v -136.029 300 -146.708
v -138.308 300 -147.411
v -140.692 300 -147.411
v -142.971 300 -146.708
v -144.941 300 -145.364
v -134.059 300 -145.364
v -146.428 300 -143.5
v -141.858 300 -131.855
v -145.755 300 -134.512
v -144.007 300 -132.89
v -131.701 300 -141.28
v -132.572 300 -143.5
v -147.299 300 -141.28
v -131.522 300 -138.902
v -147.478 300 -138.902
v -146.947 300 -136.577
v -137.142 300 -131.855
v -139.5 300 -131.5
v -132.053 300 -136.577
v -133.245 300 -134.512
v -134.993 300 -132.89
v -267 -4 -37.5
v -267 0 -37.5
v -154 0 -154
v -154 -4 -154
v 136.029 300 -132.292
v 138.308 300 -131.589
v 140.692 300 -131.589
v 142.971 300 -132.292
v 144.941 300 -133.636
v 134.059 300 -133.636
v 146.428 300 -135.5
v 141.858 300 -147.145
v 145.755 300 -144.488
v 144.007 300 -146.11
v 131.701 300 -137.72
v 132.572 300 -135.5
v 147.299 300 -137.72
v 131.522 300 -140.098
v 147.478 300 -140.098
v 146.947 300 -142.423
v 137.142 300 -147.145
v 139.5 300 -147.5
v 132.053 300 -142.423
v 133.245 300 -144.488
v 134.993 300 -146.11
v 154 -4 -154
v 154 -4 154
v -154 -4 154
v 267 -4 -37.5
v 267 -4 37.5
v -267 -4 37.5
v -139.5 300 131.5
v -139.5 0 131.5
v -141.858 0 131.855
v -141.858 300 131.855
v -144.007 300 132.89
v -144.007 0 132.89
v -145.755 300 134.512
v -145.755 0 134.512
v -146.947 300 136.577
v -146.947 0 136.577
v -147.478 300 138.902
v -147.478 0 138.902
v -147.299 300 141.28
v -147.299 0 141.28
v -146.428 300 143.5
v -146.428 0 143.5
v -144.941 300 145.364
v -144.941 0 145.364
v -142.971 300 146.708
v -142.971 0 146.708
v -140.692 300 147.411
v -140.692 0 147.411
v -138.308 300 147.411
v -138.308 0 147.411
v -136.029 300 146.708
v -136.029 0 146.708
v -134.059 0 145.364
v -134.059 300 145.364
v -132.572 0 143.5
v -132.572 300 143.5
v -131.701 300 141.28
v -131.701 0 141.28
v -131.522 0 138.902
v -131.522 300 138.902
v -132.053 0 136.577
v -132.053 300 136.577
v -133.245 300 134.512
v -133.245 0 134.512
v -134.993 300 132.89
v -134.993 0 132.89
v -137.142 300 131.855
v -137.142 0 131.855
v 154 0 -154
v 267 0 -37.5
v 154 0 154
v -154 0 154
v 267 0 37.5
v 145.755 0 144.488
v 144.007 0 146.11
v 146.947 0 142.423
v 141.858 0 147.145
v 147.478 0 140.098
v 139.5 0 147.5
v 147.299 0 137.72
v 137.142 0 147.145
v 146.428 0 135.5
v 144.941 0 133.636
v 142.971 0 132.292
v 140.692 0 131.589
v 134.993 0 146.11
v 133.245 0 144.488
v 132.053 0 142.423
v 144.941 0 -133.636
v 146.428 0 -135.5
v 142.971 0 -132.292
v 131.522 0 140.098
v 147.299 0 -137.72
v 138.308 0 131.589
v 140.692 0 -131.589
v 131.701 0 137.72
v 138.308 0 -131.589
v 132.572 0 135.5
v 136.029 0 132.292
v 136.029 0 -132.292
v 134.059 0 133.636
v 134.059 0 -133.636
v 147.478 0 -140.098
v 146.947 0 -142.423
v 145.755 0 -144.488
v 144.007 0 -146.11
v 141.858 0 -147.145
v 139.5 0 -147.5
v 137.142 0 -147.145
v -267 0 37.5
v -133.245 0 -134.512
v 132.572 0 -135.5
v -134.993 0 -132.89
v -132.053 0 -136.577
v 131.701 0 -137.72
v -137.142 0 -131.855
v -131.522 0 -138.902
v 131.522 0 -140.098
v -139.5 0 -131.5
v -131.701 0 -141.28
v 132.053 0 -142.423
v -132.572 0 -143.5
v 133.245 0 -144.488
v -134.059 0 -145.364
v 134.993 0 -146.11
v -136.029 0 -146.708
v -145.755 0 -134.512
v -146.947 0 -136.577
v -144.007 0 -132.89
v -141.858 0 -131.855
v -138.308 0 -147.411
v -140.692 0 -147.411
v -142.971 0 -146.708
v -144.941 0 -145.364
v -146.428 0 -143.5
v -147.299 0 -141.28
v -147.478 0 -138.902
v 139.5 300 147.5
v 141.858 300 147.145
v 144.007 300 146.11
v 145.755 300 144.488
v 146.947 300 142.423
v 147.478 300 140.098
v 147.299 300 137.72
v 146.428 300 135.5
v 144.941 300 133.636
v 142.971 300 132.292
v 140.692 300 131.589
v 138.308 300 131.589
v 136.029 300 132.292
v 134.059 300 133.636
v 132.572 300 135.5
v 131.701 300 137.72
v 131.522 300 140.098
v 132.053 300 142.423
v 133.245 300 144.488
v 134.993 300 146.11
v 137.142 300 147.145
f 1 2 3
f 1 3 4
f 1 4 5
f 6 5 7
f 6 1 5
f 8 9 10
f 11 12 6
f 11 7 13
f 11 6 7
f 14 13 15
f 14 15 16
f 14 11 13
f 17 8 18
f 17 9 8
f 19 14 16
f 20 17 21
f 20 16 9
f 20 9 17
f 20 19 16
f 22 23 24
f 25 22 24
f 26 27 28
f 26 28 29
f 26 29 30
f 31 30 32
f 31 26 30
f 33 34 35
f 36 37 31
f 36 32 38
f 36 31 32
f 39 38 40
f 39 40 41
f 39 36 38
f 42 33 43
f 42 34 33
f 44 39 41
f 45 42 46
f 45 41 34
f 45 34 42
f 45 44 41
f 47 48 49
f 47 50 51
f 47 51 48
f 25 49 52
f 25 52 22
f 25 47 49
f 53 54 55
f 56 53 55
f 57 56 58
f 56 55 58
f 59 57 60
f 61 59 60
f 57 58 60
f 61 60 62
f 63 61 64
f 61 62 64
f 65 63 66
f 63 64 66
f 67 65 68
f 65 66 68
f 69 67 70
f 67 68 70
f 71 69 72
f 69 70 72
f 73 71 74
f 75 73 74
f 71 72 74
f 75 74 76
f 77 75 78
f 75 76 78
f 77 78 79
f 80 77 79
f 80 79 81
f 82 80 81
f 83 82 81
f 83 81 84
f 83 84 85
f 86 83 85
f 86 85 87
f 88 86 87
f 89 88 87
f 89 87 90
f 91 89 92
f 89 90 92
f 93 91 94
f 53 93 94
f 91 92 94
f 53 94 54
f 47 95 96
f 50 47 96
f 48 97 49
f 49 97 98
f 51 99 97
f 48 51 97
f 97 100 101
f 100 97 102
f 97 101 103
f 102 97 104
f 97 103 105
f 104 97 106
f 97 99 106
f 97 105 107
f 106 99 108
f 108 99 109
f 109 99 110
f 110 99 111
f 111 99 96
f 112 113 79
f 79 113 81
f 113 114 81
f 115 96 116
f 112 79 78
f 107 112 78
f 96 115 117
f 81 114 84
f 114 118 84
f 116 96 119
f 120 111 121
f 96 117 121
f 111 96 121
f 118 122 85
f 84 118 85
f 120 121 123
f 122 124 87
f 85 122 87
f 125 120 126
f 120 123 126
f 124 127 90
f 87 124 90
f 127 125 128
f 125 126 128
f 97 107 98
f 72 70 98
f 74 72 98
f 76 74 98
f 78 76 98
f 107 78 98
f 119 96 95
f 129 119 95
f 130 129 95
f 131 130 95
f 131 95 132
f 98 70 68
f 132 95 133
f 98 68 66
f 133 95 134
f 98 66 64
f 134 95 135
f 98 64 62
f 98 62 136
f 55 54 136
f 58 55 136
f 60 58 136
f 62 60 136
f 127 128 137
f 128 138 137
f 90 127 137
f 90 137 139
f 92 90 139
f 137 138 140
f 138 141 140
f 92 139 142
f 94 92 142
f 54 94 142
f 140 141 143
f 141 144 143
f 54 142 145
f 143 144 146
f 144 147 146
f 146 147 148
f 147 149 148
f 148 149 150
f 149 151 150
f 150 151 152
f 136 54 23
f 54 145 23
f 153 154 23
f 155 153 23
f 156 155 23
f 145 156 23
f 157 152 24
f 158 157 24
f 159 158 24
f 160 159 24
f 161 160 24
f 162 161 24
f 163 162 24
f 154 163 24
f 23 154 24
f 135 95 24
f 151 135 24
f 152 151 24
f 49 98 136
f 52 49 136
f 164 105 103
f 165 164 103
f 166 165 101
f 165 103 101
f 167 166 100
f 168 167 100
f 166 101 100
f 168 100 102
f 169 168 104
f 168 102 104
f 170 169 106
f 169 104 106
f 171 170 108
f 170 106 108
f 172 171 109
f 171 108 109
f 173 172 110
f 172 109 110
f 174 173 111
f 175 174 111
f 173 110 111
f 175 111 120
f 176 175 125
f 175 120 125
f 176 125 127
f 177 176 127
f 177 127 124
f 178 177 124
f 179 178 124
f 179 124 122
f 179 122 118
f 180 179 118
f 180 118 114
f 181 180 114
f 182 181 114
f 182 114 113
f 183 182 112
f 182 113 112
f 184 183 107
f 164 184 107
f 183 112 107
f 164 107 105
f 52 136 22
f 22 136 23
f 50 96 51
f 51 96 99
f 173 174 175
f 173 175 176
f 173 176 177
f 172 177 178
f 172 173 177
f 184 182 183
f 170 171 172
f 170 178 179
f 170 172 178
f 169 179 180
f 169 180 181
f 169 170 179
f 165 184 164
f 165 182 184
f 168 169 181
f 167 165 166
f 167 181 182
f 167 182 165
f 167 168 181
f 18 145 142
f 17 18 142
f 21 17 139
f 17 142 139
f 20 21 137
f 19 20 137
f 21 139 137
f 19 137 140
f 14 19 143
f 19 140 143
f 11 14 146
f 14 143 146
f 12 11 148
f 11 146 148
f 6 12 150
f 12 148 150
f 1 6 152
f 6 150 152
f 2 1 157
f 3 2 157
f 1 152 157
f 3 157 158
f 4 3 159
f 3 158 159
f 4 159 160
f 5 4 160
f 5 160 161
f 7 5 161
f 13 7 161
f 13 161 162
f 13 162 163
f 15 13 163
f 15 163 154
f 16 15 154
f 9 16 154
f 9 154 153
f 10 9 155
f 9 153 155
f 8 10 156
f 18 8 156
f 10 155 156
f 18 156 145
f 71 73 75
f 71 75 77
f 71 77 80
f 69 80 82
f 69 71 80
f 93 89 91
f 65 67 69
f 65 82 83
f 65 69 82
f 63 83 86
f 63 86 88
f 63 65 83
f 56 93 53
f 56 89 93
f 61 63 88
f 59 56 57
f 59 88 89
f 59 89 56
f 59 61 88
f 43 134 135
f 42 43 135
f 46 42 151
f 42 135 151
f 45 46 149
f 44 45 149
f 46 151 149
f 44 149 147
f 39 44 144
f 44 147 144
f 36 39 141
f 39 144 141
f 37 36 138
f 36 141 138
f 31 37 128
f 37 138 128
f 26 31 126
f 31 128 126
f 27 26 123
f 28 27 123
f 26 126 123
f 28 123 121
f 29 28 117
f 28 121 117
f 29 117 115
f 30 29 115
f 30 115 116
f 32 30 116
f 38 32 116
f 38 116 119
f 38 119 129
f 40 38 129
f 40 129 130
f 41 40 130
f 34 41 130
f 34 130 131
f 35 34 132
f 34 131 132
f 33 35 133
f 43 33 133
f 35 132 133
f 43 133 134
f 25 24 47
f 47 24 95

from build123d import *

# Parameters (mm, degrees)
EXTRUDE_2_DEPTH = 4
SKETCH_2_R      = 8
EXTRUDE_3_DEPTH = 300


with BuildPart() as part:
    # Эскиз1 → Бобышка-Вытянуть2 (new body)
    with BuildSketch(Plane(origin=(0, 0, 0), x_dir=(1, 0, 0), z_dir=(0, 1, 0))):
        Polygon((154, -154), (-154, -154), (-267, -37.5), (-267, 37.5), (-154, 154), (154, 154), (267, 37.5), (267, -37.5), align=None)
    extrude(amount=-EXTRUDE_2_DEPTH)

    # Эскиз2 → Бобышка-Вытянуть3 (add)
    with BuildSketch(Plane(origin=(0, 0, 0), x_dir=(1, 0, 0), z_dir=(0, 1, 0))):
        with Locations(Location((-139.5, 139.5, 0), (0, 0, 270))):
            Circle(SKETCH_2_R)
        with Locations(Location((139.5, 139.5, 0), (0, 0, 90))):
            Circle(SKETCH_2_R)
        with Locations(Location((139.5, -139.5, 0), (0, 0, 270))):
            Circle(SKETCH_2_R)
        with Locations(Location((-139.5, -139.5, 0), (0, 0, 90))):
            Circle(SKETCH_2_R)
    extrude(amount=EXTRUDE_3_DEPTH)


solid = part.part
